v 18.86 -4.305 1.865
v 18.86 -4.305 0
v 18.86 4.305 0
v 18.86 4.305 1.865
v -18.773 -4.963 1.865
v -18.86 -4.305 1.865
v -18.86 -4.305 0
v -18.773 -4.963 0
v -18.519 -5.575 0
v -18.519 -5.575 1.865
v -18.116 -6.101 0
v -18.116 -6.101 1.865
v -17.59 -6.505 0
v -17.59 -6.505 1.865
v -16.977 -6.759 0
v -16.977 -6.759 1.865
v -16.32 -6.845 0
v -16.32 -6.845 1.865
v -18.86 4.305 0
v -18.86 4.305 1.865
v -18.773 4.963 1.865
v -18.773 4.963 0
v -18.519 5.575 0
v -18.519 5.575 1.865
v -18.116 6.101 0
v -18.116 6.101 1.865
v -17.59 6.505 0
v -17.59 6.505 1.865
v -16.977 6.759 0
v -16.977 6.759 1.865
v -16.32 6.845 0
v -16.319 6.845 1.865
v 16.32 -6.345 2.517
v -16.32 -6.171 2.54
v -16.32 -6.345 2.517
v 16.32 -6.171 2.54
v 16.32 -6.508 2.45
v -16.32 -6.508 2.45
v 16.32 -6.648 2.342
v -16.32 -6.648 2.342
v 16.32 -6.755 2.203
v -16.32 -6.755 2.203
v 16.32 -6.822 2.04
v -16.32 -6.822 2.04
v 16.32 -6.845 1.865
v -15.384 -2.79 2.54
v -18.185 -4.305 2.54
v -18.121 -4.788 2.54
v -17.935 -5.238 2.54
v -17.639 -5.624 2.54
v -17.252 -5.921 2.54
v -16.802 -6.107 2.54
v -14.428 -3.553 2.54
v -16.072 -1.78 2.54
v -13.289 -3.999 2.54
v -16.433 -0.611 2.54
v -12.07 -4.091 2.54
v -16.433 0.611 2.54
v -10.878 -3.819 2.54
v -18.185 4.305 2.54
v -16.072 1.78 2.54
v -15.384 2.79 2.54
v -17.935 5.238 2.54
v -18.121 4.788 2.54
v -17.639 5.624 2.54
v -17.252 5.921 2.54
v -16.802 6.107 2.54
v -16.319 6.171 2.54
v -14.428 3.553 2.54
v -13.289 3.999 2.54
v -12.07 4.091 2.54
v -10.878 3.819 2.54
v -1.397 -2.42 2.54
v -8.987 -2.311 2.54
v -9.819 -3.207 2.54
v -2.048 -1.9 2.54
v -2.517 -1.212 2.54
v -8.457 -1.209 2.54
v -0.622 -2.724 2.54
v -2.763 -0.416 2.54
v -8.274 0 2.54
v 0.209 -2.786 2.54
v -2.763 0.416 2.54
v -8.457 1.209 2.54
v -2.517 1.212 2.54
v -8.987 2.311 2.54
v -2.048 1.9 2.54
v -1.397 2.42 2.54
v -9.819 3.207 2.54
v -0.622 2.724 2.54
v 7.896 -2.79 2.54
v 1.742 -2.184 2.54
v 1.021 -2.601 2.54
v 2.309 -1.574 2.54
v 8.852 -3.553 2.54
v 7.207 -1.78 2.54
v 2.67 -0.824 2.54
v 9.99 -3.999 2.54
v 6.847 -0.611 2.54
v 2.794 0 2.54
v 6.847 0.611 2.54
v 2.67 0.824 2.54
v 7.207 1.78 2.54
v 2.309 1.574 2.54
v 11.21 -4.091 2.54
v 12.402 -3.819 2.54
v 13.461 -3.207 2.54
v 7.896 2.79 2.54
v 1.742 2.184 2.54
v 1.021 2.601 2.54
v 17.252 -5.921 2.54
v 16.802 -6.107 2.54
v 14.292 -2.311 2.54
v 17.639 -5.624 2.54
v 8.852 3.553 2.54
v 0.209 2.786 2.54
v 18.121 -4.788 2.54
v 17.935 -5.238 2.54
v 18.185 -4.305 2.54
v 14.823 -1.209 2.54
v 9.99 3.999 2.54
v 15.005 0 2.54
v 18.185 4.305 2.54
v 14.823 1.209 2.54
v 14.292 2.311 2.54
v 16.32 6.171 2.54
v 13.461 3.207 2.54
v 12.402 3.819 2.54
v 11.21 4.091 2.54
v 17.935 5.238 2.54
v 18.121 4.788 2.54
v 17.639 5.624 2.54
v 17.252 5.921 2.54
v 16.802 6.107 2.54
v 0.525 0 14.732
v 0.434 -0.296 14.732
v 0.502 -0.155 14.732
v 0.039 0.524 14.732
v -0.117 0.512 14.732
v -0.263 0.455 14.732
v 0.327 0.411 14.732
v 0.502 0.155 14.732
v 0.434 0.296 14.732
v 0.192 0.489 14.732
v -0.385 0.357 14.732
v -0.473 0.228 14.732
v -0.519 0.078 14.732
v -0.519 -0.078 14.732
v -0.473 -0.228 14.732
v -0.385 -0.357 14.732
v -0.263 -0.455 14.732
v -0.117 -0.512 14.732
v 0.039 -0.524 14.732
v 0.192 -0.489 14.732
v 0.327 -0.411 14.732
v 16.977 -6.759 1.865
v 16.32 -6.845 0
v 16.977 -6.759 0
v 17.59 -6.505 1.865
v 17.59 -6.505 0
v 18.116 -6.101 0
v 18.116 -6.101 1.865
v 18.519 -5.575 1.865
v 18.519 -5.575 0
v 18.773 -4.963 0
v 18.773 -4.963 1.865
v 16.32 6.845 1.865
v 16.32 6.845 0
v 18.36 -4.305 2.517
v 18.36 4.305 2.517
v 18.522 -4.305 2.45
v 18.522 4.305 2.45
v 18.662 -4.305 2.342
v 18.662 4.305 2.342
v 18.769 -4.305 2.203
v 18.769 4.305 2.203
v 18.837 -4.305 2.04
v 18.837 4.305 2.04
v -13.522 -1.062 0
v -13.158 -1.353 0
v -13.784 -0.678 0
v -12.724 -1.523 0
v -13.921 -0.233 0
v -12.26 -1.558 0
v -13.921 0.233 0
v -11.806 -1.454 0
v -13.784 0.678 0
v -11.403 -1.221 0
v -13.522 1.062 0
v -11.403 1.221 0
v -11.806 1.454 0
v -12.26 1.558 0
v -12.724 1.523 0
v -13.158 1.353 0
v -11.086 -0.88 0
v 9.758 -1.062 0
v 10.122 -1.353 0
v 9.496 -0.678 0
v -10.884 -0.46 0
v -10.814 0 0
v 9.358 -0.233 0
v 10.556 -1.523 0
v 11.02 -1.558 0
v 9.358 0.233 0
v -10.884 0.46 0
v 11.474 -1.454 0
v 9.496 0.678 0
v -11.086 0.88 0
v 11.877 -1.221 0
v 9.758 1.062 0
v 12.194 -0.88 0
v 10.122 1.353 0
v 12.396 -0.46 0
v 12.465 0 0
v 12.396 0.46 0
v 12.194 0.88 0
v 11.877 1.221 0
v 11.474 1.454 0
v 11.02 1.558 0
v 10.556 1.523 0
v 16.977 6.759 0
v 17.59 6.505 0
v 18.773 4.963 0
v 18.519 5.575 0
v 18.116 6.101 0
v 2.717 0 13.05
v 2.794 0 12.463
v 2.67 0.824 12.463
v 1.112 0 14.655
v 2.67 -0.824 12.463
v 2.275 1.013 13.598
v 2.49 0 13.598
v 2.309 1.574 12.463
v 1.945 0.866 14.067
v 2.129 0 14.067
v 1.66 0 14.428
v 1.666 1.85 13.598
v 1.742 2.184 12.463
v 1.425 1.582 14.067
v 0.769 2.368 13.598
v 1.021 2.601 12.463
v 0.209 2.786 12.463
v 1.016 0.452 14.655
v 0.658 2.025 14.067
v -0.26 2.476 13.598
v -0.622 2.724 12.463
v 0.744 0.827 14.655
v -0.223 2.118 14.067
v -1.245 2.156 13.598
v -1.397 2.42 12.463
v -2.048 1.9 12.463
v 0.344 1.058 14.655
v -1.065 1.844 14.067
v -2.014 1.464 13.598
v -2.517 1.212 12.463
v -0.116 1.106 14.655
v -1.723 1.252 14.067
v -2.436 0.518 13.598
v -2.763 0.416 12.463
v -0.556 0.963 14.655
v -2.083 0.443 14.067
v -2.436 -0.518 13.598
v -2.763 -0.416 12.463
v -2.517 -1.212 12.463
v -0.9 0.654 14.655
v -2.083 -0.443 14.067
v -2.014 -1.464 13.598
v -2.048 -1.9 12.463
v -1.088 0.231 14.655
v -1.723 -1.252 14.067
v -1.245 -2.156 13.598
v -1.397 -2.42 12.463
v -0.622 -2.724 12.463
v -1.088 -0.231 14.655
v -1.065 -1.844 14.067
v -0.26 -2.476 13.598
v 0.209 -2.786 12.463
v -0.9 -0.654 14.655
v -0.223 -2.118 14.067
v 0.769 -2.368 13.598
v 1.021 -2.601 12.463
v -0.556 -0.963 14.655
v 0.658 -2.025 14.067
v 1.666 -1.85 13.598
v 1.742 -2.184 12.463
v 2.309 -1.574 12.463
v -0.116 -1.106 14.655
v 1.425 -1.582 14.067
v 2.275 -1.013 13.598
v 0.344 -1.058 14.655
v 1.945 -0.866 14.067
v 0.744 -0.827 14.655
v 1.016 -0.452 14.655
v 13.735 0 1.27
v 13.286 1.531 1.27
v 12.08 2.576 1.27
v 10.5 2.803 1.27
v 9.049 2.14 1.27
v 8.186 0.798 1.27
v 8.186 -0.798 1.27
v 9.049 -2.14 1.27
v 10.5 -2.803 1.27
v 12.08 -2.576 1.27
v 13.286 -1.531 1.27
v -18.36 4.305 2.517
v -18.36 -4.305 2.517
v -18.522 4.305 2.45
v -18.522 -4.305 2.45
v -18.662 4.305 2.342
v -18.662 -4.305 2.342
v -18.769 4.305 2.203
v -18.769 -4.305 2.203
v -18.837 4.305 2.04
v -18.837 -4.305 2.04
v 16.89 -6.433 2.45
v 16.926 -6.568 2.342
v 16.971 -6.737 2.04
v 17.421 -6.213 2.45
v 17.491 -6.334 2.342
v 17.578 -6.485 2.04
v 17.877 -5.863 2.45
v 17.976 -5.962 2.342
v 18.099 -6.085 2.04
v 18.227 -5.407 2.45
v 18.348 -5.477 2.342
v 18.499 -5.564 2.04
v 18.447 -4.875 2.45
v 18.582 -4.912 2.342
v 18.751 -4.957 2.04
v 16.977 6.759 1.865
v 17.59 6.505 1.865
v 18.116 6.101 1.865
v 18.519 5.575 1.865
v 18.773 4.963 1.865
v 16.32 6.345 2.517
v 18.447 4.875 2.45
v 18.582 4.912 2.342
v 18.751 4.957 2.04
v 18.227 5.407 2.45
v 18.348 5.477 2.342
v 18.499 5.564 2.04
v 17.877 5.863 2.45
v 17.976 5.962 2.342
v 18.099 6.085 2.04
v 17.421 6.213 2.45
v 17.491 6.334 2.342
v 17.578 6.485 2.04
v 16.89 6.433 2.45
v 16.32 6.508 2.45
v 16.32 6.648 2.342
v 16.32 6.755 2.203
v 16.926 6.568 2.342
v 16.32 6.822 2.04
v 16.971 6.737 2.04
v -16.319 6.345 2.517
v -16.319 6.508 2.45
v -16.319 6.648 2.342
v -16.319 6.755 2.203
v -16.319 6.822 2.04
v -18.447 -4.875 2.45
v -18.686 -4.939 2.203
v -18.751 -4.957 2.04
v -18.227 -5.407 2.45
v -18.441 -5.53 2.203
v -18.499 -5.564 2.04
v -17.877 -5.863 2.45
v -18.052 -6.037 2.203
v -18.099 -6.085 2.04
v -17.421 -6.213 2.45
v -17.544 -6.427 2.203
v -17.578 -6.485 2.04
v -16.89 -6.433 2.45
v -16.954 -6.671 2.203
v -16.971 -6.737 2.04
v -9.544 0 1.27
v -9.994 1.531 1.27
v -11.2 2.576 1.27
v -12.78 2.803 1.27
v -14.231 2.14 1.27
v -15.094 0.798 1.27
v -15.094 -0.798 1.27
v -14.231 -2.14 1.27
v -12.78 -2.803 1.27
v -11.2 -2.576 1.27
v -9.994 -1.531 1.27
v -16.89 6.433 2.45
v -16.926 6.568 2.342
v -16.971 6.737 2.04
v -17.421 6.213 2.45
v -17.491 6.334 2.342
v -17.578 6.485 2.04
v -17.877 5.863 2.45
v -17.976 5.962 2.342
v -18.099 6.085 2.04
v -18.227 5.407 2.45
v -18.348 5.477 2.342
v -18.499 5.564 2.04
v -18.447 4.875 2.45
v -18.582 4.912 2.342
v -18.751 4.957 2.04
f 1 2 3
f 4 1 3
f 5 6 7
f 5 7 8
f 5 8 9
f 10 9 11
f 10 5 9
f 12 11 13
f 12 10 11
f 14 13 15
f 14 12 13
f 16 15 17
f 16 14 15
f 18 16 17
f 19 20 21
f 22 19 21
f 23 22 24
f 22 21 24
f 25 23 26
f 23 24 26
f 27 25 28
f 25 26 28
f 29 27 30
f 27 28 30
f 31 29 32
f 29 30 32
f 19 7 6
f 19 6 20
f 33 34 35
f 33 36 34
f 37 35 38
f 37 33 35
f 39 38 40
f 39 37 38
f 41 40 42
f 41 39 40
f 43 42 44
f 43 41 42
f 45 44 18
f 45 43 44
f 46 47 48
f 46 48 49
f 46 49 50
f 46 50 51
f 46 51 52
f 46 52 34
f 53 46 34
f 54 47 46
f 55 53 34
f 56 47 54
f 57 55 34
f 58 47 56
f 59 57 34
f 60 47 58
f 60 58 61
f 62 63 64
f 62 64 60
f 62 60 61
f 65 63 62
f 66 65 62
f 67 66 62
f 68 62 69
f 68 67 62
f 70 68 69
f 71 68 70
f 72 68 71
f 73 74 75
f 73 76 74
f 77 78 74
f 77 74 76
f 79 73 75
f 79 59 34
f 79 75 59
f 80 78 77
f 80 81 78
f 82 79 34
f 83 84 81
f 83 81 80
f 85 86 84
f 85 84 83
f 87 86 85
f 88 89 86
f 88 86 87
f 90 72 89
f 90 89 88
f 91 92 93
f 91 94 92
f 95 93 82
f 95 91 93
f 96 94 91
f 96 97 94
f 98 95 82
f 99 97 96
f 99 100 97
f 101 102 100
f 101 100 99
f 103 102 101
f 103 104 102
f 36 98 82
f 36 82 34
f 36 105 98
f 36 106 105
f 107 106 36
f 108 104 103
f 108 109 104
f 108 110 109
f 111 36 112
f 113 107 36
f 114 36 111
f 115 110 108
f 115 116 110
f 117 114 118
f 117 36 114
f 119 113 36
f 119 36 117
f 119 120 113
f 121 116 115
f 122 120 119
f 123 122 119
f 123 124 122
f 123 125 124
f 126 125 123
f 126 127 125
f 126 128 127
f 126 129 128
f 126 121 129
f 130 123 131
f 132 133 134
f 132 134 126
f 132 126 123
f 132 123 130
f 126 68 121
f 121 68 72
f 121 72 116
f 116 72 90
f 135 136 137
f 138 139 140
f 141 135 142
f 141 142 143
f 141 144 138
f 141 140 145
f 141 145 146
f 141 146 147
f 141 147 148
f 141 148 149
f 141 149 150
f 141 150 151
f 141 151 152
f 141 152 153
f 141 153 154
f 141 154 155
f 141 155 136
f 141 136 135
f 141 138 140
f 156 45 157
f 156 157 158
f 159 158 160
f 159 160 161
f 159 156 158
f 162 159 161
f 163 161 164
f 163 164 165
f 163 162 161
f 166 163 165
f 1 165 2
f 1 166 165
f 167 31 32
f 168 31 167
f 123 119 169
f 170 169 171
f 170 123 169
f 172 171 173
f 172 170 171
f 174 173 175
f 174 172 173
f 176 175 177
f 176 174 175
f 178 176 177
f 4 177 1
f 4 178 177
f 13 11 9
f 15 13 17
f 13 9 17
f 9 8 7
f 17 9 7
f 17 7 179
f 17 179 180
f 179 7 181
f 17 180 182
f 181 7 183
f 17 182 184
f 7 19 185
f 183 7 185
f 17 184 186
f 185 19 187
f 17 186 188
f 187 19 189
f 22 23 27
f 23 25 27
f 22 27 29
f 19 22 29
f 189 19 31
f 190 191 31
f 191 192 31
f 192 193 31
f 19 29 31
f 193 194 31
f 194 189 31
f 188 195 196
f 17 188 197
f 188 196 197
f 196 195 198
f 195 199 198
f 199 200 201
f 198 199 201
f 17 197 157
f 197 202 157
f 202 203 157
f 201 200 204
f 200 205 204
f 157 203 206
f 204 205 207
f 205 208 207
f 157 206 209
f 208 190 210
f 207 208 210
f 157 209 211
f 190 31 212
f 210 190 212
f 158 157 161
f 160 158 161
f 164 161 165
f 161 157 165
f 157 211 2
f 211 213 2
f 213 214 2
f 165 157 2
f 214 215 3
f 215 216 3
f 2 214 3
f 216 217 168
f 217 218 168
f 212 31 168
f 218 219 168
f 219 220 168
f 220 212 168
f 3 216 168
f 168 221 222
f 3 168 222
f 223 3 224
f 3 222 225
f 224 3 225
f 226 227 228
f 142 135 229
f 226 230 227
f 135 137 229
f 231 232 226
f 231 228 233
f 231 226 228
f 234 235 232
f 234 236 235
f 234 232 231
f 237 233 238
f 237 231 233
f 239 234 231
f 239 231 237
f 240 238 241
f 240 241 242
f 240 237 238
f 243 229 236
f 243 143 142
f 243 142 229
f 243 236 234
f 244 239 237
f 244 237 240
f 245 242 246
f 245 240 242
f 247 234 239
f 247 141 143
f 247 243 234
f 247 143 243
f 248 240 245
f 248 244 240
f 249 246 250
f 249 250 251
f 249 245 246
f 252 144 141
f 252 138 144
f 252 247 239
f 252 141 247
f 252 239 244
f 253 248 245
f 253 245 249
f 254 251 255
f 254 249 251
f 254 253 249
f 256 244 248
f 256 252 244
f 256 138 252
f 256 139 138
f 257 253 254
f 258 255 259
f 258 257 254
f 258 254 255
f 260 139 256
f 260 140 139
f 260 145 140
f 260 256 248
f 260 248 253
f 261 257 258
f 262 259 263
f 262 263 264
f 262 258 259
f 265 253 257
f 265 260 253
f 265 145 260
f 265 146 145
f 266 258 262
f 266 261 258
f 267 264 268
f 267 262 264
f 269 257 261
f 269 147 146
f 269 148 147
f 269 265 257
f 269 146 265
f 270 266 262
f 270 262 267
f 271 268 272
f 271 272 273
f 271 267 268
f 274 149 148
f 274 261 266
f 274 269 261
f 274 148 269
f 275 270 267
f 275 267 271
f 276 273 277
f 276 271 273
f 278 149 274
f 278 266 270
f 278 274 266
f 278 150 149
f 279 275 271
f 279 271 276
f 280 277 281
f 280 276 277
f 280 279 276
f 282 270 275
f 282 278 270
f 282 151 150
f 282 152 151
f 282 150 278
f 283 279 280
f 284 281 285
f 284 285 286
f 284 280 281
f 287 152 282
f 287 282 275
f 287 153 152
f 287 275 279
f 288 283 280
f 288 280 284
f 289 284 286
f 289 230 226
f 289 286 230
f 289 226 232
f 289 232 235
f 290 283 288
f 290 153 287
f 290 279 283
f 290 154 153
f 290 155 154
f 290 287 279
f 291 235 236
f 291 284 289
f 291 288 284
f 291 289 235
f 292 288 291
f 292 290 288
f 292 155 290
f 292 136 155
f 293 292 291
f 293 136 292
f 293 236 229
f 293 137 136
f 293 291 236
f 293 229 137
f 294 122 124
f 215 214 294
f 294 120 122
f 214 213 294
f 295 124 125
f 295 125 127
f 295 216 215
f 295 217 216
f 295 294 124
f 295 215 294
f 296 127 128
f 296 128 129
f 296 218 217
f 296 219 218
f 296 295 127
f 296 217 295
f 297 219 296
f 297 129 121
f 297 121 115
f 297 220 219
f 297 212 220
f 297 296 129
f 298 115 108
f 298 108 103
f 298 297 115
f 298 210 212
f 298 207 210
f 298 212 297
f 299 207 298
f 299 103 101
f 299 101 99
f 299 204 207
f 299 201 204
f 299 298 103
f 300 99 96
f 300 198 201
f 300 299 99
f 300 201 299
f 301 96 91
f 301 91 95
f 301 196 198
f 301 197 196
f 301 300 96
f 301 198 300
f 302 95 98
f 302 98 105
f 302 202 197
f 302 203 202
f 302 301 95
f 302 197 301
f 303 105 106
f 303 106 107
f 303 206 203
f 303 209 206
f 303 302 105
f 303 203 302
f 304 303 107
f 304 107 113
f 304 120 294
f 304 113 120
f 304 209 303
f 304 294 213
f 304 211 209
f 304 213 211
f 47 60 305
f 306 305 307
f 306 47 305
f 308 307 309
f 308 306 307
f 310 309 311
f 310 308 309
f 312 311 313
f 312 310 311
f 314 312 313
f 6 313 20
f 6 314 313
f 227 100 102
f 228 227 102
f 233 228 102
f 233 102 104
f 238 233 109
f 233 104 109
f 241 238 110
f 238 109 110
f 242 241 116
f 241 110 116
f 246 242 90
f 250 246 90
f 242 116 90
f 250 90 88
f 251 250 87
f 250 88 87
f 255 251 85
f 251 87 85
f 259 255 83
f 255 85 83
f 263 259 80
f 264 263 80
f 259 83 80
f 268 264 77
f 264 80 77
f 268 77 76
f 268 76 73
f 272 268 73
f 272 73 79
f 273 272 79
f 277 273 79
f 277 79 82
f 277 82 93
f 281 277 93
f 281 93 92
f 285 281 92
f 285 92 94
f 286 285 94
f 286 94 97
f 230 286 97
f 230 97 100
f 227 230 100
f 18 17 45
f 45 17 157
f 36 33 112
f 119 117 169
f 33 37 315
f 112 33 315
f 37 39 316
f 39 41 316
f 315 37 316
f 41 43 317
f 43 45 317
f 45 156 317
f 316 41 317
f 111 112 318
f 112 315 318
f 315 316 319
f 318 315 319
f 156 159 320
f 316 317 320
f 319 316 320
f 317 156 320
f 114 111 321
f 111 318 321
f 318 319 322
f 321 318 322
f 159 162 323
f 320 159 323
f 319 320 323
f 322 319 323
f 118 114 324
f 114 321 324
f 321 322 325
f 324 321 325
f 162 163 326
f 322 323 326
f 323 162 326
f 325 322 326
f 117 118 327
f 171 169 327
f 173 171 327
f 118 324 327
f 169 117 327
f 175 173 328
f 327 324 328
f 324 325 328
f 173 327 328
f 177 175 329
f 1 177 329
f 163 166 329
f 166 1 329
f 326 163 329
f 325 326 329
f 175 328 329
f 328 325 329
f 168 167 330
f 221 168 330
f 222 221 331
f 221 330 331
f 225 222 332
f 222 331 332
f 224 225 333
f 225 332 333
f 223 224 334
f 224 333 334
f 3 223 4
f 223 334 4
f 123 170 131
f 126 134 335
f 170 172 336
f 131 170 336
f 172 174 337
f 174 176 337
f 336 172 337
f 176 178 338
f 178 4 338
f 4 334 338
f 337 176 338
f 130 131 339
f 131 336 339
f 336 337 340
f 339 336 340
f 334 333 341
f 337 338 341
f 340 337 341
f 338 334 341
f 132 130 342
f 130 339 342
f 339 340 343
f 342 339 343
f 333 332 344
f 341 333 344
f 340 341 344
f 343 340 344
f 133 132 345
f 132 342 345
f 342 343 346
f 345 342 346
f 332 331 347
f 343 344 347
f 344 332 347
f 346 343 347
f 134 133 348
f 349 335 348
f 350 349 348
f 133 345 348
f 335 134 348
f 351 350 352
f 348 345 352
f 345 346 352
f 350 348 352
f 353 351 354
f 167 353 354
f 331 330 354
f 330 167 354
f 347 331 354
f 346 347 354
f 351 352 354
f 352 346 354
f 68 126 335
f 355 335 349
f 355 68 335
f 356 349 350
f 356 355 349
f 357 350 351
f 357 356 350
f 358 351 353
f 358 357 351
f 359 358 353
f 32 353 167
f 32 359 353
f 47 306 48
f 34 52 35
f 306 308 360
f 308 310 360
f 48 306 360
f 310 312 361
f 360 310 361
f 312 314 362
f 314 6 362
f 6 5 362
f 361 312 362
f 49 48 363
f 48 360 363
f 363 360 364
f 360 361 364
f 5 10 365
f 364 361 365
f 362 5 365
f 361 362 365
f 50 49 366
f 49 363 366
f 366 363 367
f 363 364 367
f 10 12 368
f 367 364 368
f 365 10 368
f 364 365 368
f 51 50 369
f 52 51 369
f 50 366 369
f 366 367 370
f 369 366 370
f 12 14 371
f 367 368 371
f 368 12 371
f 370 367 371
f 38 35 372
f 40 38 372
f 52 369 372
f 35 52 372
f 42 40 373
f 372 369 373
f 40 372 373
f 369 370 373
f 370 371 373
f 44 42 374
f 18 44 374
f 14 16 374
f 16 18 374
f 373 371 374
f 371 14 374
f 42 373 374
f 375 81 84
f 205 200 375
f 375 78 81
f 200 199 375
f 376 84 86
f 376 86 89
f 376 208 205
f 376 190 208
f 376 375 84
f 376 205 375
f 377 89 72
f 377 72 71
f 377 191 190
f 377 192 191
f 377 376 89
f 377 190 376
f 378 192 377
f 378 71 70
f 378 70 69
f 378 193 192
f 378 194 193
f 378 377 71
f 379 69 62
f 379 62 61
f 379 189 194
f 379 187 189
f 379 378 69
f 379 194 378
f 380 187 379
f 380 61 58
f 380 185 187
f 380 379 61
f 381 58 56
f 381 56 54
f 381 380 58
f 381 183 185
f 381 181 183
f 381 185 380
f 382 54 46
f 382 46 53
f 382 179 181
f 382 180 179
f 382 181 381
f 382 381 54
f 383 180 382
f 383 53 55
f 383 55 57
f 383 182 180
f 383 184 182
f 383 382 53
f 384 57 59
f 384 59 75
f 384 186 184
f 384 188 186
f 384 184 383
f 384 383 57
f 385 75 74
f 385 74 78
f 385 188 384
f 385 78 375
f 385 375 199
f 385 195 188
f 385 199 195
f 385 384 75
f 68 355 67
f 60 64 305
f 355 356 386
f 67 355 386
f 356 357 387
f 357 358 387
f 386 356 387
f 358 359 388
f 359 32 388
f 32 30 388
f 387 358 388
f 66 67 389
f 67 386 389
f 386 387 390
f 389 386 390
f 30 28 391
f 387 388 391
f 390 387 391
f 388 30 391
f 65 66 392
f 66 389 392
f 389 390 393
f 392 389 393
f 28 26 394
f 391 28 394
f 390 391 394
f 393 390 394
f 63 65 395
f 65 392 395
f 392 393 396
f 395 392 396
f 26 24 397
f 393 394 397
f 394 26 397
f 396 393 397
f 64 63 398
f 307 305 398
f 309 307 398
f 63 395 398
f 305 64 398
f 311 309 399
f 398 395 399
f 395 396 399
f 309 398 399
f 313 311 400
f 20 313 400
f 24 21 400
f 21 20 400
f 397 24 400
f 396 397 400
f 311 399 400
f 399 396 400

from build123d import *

# Parameters (mm, degrees)
F0_R     = 2.794
F1_DEPTH = 14.732
F0_W     = 37.719
F0_H     = 13.6906
F0_R_2   = 1.5621
F2_DEPTH = 2.54
F3_SIZE  = 2.53999
F4_R     = 2.54
F5_R     = 2.2688779059
F6_R     = 0.6745312693


# Not quite as in the source:
# - a fillet or chamfer is up to 0.001 mm smaller than in the source, because OpenCascade refuses the exact size


with BuildPart() as f1:
    # F0 (on Top) → F1 (new body)
    with BuildSketch(Plane.XY):
        Circle(F0_R)
    extrude(amount=F1_DEPTH)

    # F0 (on Top) → F2 (join)
    with BuildSketch(Plane.XY):
        Rectangle(F0_W, F0_H)
        with Locations((-12.3765456688, 0)):
            Circle(F0_R_2, mode=Mode.SUBTRACT)
        Circle(F0_R, mode=Mode.SUBTRACT)
        with Locations((10.9031473519, 0)):
            Circle(F0_R_2, mode=Mode.SUBTRACT)
    extrude(amount=F2_DEPTH)

    # F3 (size 2.54 in the source; OpenCascade refuses exactly that, so slightly less here)
    f3_edges = [f1.edges().sort_by_distance(p)[0] for p in [
        (-13.938646, 0, 2.54),
        (9.341047, 0, 2.54),
    ]]
    chamfer(f3_edges, length=F3_SIZE)

    # F4
    f4_edges = [f1.edges().sort_by_distance(p)[0] for p in [
        (18.8595, -6.8453, 1.27),
        (18.8595, 6.8453, 1.27),
        (-18.8595, -6.8453, 1.27),
        (-18.8595, 6.8453, 1.27),
    ]]
    fillet(f4_edges, radius=F4_R)

    # F5
    f5_edges = [f1.edges().sort_by_distance(p)[0] for p in [
        (-2.794, 0, 14.732),
    ]]
    fillet(f5_edges, radius=F5_R)

    # F6
    f6_edges = [f1.edges().sort_by_distance(p)[0] for p in [
        (0, -6.8453, 2.54),
        (18.115551, -6.101351, 2.54),
        (18.8595, 0, 2.54),
        (0, 6.8453, 2.54),
        (18.115551, 6.101351, 2.54),
        (-18.115551, 6.101351, 2.54),
        (-18.8595, 0, 2.54),
        (-18.115551, -6.101351, 2.54),
    ]]
    fillet(f6_edges, radius=F6_R)


solid = f1.part
